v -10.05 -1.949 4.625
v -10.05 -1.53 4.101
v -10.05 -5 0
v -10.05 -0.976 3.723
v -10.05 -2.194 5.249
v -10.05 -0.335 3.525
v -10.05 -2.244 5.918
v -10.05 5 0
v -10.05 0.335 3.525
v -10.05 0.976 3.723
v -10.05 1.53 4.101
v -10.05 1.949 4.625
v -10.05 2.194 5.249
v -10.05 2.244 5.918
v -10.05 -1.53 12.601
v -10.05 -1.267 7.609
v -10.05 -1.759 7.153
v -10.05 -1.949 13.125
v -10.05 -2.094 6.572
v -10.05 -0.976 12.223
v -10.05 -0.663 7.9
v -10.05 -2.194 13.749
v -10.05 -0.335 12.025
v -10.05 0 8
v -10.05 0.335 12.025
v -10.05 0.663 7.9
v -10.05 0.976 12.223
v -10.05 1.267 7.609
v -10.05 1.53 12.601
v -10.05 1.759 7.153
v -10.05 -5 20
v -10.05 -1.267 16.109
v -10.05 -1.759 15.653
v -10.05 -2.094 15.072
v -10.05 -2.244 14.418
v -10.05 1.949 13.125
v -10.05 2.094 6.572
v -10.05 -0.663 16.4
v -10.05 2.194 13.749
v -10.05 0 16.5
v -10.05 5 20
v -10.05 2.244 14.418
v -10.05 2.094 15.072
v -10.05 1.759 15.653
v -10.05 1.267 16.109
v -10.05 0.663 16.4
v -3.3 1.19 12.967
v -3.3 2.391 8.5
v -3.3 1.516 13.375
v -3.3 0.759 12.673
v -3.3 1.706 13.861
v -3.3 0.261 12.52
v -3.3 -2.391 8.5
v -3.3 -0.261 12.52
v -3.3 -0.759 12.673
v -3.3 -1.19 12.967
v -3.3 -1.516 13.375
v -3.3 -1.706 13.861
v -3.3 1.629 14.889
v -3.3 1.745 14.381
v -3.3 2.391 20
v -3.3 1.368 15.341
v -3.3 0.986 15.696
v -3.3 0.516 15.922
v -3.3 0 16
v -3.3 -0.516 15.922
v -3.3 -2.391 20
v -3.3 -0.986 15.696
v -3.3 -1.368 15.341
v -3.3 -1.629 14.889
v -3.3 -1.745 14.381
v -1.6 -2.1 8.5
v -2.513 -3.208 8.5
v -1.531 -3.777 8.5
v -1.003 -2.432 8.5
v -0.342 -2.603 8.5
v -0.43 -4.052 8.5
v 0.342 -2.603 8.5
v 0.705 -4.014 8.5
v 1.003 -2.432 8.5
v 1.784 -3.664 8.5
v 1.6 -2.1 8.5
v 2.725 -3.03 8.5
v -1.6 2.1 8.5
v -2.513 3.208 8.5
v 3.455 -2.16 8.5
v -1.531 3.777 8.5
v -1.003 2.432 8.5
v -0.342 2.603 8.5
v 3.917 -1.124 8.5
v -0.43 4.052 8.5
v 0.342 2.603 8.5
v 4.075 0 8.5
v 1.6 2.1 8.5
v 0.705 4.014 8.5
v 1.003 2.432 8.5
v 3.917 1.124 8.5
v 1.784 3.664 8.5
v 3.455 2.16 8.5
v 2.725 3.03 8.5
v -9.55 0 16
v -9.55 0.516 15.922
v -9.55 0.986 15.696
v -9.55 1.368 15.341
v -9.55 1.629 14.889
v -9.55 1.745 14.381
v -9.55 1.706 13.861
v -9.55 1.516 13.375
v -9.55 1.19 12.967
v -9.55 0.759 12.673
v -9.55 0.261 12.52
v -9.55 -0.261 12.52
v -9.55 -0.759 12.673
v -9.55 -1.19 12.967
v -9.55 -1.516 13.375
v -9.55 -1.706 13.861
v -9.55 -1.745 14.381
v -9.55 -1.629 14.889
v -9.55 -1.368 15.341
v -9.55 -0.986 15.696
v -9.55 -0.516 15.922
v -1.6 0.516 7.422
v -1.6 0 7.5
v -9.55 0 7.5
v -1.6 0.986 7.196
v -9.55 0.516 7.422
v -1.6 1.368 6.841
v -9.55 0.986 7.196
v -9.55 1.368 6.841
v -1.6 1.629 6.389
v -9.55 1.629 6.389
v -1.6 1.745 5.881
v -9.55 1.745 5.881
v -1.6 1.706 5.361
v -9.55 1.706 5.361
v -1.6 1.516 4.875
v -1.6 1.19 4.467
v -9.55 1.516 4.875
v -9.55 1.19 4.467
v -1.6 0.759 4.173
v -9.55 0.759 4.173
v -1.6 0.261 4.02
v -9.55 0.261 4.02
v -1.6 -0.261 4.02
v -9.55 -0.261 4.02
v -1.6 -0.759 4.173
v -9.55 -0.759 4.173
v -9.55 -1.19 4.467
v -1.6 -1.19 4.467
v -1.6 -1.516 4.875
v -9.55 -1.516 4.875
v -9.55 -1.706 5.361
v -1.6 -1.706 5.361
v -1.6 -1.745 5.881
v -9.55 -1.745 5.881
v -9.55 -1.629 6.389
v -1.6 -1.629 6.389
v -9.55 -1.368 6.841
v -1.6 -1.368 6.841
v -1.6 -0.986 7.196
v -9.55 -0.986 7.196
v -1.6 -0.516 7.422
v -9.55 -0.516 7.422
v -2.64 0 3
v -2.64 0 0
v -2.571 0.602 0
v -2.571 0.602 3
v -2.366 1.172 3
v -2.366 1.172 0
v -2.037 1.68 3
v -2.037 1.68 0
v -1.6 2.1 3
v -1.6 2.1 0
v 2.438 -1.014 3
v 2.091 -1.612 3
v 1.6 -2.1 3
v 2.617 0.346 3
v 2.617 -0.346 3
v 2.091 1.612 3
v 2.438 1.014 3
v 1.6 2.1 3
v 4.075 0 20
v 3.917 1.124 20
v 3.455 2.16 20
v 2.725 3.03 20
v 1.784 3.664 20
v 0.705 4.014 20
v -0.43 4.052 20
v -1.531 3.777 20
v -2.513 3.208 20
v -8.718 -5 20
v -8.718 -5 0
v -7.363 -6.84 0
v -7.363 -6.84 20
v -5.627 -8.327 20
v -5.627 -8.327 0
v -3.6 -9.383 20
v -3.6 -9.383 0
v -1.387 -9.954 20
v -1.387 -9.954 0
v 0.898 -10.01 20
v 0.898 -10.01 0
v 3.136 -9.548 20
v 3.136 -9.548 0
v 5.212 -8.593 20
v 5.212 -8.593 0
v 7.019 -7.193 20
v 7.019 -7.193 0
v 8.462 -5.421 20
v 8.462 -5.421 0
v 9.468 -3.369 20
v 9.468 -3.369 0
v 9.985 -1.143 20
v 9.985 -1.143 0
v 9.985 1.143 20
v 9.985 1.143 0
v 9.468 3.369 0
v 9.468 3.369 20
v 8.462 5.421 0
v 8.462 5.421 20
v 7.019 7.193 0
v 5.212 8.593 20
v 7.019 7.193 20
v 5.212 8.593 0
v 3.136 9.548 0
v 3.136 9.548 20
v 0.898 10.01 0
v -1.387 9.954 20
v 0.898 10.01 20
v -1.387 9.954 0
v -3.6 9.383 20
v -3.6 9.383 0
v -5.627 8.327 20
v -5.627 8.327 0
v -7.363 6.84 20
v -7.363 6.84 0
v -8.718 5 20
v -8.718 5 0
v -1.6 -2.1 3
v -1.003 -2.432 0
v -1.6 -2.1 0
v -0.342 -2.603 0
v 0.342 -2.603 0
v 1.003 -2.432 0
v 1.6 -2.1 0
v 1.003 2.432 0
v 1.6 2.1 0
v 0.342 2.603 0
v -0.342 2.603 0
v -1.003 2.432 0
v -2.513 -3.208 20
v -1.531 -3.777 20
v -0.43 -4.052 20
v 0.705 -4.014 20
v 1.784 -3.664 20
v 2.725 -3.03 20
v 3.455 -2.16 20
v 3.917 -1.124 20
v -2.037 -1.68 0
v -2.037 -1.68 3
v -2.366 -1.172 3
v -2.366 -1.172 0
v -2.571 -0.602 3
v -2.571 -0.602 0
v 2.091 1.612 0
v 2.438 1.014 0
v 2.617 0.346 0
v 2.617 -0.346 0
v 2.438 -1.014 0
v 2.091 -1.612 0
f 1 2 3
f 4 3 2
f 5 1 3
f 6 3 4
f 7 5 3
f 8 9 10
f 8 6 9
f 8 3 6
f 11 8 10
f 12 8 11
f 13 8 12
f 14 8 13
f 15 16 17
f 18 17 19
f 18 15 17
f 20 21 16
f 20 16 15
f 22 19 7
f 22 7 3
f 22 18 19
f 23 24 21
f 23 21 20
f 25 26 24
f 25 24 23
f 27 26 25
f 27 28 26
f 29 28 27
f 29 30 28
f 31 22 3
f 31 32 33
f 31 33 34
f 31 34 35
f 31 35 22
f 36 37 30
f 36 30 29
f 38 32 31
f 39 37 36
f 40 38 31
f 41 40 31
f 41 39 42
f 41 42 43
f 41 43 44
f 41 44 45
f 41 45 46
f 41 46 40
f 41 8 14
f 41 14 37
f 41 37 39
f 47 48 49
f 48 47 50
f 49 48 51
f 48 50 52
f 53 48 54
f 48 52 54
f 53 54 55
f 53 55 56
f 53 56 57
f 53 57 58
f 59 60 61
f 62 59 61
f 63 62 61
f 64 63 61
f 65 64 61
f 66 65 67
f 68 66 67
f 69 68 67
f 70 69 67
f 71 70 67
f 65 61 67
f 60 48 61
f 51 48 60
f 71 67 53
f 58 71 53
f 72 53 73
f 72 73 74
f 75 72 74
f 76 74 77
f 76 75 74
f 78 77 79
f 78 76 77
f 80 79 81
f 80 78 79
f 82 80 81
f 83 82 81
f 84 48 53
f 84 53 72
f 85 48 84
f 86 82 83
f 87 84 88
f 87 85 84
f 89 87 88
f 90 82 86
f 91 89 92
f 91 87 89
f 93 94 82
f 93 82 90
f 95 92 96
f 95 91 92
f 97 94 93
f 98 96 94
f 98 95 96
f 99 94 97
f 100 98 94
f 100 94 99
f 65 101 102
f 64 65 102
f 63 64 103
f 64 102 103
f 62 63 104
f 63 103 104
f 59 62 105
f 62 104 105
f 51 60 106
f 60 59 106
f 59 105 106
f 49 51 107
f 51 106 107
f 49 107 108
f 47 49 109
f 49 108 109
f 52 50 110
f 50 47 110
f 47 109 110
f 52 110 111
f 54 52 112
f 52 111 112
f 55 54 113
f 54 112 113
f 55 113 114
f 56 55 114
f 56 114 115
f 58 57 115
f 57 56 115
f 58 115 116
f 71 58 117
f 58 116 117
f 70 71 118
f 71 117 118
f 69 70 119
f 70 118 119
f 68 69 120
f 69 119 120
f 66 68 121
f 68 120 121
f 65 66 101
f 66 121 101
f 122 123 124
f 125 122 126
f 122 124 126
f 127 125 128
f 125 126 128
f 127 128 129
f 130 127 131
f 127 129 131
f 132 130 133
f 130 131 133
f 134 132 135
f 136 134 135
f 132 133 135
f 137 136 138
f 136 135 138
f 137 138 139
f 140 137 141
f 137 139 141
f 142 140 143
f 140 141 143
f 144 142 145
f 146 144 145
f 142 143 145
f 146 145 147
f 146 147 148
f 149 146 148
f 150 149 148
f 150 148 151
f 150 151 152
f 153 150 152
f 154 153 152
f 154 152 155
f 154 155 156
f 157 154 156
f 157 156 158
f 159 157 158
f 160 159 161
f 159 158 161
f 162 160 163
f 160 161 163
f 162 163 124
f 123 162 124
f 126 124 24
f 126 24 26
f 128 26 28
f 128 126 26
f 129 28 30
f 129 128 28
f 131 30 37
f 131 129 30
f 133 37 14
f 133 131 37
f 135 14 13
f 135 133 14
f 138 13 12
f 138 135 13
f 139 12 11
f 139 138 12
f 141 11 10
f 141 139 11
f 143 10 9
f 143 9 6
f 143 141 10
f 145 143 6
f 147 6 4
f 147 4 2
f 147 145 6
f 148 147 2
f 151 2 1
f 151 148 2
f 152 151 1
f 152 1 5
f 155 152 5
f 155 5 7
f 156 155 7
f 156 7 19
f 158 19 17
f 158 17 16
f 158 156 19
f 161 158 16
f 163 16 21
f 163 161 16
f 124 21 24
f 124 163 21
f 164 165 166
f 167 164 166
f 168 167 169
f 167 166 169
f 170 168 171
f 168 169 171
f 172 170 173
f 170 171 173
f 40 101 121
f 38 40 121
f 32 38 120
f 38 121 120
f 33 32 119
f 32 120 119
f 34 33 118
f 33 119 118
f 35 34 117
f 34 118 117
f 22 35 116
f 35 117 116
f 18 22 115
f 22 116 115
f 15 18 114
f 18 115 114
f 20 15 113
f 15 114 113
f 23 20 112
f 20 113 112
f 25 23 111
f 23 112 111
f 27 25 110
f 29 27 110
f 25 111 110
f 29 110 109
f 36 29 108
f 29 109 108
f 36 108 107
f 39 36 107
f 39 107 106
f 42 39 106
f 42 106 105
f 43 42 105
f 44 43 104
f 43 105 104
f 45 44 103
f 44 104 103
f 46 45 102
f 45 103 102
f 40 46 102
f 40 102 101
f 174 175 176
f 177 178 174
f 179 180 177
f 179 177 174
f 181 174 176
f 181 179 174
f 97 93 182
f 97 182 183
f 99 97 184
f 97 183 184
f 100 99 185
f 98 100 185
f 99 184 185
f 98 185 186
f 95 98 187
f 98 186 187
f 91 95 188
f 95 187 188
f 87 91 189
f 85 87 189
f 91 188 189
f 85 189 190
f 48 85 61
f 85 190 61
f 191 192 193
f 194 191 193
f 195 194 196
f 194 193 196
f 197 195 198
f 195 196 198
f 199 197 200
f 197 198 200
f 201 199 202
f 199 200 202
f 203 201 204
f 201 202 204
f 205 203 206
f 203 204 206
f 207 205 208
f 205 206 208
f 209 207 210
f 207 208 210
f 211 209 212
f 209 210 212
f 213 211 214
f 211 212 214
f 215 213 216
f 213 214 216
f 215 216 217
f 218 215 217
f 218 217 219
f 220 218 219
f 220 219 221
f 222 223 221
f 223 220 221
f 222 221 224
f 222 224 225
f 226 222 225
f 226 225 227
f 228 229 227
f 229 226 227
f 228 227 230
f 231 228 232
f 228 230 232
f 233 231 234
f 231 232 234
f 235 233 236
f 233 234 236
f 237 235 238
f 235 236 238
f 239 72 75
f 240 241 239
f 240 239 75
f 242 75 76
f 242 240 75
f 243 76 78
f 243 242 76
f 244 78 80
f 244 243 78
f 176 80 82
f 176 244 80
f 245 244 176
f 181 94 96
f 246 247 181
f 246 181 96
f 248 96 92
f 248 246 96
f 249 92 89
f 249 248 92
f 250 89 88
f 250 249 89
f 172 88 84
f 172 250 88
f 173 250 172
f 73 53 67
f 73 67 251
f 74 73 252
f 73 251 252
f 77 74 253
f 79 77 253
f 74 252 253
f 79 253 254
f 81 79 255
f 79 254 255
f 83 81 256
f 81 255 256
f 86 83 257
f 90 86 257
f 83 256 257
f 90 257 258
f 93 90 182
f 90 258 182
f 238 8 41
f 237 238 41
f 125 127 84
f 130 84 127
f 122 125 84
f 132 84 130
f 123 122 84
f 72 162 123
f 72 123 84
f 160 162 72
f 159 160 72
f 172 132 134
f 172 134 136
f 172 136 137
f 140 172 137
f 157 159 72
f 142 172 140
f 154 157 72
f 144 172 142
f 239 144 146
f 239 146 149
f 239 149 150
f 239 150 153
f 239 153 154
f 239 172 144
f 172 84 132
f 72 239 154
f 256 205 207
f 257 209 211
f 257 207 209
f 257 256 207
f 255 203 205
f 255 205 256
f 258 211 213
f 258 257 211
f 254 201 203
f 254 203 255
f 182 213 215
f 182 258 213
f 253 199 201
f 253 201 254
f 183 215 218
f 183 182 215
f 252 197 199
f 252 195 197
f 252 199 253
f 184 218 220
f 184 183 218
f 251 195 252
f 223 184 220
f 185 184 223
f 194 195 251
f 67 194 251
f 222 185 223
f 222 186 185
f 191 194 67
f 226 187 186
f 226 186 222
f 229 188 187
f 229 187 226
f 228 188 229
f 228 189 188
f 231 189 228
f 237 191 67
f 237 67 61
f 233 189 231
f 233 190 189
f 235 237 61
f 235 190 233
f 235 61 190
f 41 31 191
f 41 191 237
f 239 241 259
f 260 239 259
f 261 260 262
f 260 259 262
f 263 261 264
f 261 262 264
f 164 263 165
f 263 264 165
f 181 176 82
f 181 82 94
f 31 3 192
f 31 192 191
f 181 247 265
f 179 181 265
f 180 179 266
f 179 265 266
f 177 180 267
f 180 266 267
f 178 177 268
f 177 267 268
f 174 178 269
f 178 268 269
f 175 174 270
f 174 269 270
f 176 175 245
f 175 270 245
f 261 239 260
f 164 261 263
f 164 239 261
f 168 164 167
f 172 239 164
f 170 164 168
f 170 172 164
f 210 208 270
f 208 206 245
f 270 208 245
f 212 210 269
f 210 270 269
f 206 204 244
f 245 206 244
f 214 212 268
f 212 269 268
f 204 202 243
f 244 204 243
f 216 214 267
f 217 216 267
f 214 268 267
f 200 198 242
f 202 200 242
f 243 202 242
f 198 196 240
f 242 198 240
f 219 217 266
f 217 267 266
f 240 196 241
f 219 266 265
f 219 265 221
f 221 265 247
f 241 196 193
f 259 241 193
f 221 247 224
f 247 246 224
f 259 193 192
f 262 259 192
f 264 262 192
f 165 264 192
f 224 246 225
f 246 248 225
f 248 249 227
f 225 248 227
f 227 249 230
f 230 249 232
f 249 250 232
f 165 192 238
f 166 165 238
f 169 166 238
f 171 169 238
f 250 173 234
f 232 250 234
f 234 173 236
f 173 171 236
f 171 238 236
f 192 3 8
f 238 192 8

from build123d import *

# Parameters (mm, degrees)
SKETCH1_R                = 10.05
BOSS_EXTRUDE1_DEPTH      = 20
CUT_EXTRUDE2_DEPTH       = 8.5
CUT_EXTRUDE3_DEPTH       = 3
CUT_EXTRUDE1_DEPTH       = 11.5
BOSS_EXTRUDE2_REACH      = 32.083
BOSS_EXTRUDE2_END_RADIUS = 10.05
SKETCH8_W                = 20
SKETCH8_H                = 10
SKETCH6_R                = 1.75
CUT_EXTRUDE4_DEPTH       = 8.45
CUT_EXTRUDE5_REACH       = 32.083
CHAMFER1_SIZE            = 0.5


with BuildPart() as part:
    # Sketch1 → Boss-Extrude1 (new body)
    with BuildSketch(Plane.XY):
        Circle(SKETCH1_R)
    extrude(amount=BOSS_EXTRUDE1_DEPTH)

    # Sketch4 → Cut-Extrude2 (cut)
    with BuildSketch(Plane(origin=(0, 0, 0), x_dir=(-1, 0, 0), z_dir=(0, 0, -1))):
        with BuildLine():
            Line((-1.6, -2.1), (-1.6, 2.1))
            ThreePointArc((-1.6, 2.1), (0, 2.625143683), (1.6, 2.1))
            Line((1.6, 2.1), (1.6, -2.1))
            ThreePointArc((1.6, -2.1), (0, -2.625143683), (-1.6, -2.1))
        make_face()
    extrude(amount=-CUT_EXTRUDE2_DEPTH, mode=Mode.SUBTRACT)

    # Sketch5 → Cut-Extrude3 (cut)
    with BuildSketch(Plane(origin=(0, 0, 0), x_dir=(-1, 0, 0), z_dir=(0, 0, -1))):
        with BuildLine():
            Line((-1.6, -2.1), (-1.6, 2.1))
            ThreePointArc((-1.6, 2.1), (-2.640075756, 0), (-1.6, -2.1))
        make_face()
        with BuildLine():
            ThreePointArc((1.6, -2.1), (2.365810771, -1.171724966), (2.640075756, 0))
            ThreePointArc((2.640075756, 0), (2.365810771, 1.171724966), (1.6, 2.1))
            Line((1.6, 2.1), (1.6, -2.1))
        make_face()
    extrude(amount=-CUT_EXTRUDE3_DEPTH, mode=Mode.SUBTRACT)

    # Sketch3 → Cut-Extrude1 (cut)
    with BuildSketch(Plane.XY.offset(20)):
        with BuildLine():
            ThreePointArc((4.075, 0), (1.256607536, 3.876411033), (-3.3, 2.390737334))
            Line((-3.3, 2.390737334), (-3.3, -2.390737334))
            ThreePointArc((-3.3, -2.390737334), (1.256607536, -3.876411033), (4.075, 0))
        make_face()
    extrude(amount=-CUT_EXTRUDE1_DEPTH, mode=Mode.SUBTRACT)

    # Boss-Extrude2: up to this cylinder (the profile starts outside it)
    boss_extrude2_end = Plane(origin=(0, 0, 10), z_dir=(0, 0, -1)) * Cylinder(BOSS_EXTRUDE2_END_RADIUS, 85.266, mode=Mode.PRIVATE)
    # Sketch8 → Boss-Extrude2 (add, up to the surface)
    with BuildSketch(Plane.ZY.offset(10.05), mode=Mode.PRIVATE) as boss_extrude2_sk1:
        with Locations((10, 0)):
            Rectangle(SKETCH8_W, SKETCH8_H)
    boss_extrude2_tool1 = extrude(boss_extrude2_sk1.sketch, amount=-BOSS_EXTRUDE2_REACH, mode=Mode.PRIVATE) - boss_extrude2_end
    add(boss_extrude2_tool1.solids().sort_by_distance((-10.05, 0, 10))[0])
    add(boss_extrude2_tool1.solids().sort_by_distance((-10.05, 0, 10))[1])

    # Sketch6 → Cut-Extrude4 (cut)
    with BuildSketch(Plane.ZY.offset(10.05)):
        with Locations((5.75, 0)):
            Circle(SKETCH6_R)
    extrude(amount=-CUT_EXTRUDE4_DEPTH, mode=Mode.SUBTRACT)

    # Sketch7 → Cut-Extrude5 (cut, up to next)
    with BuildSketch(Plane.ZY.offset(10.05), mode=Mode.PRIVATE) as cut_extrude5_sk1:
        with BuildLine():
            ThreePointArc((16, 0), (14.25, 1.75), (12.5, 0))
            Line((12.5, 0), (16, 0))
        make_face()
    cut_extrude5_tool1 = extrude(cut_extrude5_sk1.sketch, amount=-CUT_EXTRUDE5_REACH, mode=Mode.PRIVATE) & part.part
    # Sketch7 → Cut-Extrude5 (cut, up to next)
    with BuildSketch(Plane.ZY.offset(10.05), mode=Mode.PRIVATE) as cut_extrude5_sk2:
        with BuildLine():
            Line((16, 0), (12.5, 0))
            ThreePointArc((12.5, 0), (14.25, -1.75), (16, 0))
        make_face()
    cut_extrude5_tool2 = extrude(cut_extrude5_sk2.sketch, amount=-CUT_EXTRUDE5_REACH, mode=Mode.PRIVATE) & part.part
    # Sketch7 → Cut-Extrude5 (cut, up to next)
    with BuildSketch(Plane.ZY.offset(10.05), mode=Mode.PRIVATE) as cut_extrude5_sk3:
        with BuildLine():
            ThreePointArc((16, 0), (14.25, 1.75), (12.5, 0))
            Line((12.5, 0), (16, 0))
        make_face()
    cut_extrude5_tool3 = extrude(cut_extrude5_sk3.sketch, amount=-CUT_EXTRUDE5_REACH, mode=Mode.PRIVATE) & part.part
    # Sketch7 → Cut-Extrude5 (cut, up to next)
    with BuildSketch(Plane.ZY.offset(10.05), mode=Mode.PRIVATE) as cut_extrude5_sk4:
        with BuildLine():
            Line((16, 0), (12.5, 0))
            ThreePointArc((12.5, 0), (14.25, -1.75), (16, 0))
        make_face()
    cut_extrude5_tool4 = extrude(cut_extrude5_sk4.sketch, amount=-CUT_EXTRUDE5_REACH, mode=Mode.PRIVATE) & part.part
    add(cut_extrude5_tool1.solids().sort_by_distance((-10.05, 0.742723, 14.25))[0], mode=Mode.SUBTRACT)
    add(cut_extrude5_tool2.solids().sort_by_distance((-10.05, -0.742723, 14.25))[0], mode=Mode.SUBTRACT)
    add(cut_extrude5_tool3.solids().sort_by_distance((-10.05, 0.742723, 14.25))[0], mode=Mode.SUBTRACT)
    add(cut_extrude5_tool4.solids().sort_by_distance((-10.05, -0.742723, 14.25))[0], mode=Mode.SUBTRACT)

    # Chamfer1
    chamfer1_edges = [part.edges().sort_by_distance(p)[0] for p in [
        (-10.05, 0, 4),
        (-10.05, 0, 12.5),
    ]]
    chamfer(chamfer1_edges, length=CHAMFER1_SIZE)


solid = part.part
